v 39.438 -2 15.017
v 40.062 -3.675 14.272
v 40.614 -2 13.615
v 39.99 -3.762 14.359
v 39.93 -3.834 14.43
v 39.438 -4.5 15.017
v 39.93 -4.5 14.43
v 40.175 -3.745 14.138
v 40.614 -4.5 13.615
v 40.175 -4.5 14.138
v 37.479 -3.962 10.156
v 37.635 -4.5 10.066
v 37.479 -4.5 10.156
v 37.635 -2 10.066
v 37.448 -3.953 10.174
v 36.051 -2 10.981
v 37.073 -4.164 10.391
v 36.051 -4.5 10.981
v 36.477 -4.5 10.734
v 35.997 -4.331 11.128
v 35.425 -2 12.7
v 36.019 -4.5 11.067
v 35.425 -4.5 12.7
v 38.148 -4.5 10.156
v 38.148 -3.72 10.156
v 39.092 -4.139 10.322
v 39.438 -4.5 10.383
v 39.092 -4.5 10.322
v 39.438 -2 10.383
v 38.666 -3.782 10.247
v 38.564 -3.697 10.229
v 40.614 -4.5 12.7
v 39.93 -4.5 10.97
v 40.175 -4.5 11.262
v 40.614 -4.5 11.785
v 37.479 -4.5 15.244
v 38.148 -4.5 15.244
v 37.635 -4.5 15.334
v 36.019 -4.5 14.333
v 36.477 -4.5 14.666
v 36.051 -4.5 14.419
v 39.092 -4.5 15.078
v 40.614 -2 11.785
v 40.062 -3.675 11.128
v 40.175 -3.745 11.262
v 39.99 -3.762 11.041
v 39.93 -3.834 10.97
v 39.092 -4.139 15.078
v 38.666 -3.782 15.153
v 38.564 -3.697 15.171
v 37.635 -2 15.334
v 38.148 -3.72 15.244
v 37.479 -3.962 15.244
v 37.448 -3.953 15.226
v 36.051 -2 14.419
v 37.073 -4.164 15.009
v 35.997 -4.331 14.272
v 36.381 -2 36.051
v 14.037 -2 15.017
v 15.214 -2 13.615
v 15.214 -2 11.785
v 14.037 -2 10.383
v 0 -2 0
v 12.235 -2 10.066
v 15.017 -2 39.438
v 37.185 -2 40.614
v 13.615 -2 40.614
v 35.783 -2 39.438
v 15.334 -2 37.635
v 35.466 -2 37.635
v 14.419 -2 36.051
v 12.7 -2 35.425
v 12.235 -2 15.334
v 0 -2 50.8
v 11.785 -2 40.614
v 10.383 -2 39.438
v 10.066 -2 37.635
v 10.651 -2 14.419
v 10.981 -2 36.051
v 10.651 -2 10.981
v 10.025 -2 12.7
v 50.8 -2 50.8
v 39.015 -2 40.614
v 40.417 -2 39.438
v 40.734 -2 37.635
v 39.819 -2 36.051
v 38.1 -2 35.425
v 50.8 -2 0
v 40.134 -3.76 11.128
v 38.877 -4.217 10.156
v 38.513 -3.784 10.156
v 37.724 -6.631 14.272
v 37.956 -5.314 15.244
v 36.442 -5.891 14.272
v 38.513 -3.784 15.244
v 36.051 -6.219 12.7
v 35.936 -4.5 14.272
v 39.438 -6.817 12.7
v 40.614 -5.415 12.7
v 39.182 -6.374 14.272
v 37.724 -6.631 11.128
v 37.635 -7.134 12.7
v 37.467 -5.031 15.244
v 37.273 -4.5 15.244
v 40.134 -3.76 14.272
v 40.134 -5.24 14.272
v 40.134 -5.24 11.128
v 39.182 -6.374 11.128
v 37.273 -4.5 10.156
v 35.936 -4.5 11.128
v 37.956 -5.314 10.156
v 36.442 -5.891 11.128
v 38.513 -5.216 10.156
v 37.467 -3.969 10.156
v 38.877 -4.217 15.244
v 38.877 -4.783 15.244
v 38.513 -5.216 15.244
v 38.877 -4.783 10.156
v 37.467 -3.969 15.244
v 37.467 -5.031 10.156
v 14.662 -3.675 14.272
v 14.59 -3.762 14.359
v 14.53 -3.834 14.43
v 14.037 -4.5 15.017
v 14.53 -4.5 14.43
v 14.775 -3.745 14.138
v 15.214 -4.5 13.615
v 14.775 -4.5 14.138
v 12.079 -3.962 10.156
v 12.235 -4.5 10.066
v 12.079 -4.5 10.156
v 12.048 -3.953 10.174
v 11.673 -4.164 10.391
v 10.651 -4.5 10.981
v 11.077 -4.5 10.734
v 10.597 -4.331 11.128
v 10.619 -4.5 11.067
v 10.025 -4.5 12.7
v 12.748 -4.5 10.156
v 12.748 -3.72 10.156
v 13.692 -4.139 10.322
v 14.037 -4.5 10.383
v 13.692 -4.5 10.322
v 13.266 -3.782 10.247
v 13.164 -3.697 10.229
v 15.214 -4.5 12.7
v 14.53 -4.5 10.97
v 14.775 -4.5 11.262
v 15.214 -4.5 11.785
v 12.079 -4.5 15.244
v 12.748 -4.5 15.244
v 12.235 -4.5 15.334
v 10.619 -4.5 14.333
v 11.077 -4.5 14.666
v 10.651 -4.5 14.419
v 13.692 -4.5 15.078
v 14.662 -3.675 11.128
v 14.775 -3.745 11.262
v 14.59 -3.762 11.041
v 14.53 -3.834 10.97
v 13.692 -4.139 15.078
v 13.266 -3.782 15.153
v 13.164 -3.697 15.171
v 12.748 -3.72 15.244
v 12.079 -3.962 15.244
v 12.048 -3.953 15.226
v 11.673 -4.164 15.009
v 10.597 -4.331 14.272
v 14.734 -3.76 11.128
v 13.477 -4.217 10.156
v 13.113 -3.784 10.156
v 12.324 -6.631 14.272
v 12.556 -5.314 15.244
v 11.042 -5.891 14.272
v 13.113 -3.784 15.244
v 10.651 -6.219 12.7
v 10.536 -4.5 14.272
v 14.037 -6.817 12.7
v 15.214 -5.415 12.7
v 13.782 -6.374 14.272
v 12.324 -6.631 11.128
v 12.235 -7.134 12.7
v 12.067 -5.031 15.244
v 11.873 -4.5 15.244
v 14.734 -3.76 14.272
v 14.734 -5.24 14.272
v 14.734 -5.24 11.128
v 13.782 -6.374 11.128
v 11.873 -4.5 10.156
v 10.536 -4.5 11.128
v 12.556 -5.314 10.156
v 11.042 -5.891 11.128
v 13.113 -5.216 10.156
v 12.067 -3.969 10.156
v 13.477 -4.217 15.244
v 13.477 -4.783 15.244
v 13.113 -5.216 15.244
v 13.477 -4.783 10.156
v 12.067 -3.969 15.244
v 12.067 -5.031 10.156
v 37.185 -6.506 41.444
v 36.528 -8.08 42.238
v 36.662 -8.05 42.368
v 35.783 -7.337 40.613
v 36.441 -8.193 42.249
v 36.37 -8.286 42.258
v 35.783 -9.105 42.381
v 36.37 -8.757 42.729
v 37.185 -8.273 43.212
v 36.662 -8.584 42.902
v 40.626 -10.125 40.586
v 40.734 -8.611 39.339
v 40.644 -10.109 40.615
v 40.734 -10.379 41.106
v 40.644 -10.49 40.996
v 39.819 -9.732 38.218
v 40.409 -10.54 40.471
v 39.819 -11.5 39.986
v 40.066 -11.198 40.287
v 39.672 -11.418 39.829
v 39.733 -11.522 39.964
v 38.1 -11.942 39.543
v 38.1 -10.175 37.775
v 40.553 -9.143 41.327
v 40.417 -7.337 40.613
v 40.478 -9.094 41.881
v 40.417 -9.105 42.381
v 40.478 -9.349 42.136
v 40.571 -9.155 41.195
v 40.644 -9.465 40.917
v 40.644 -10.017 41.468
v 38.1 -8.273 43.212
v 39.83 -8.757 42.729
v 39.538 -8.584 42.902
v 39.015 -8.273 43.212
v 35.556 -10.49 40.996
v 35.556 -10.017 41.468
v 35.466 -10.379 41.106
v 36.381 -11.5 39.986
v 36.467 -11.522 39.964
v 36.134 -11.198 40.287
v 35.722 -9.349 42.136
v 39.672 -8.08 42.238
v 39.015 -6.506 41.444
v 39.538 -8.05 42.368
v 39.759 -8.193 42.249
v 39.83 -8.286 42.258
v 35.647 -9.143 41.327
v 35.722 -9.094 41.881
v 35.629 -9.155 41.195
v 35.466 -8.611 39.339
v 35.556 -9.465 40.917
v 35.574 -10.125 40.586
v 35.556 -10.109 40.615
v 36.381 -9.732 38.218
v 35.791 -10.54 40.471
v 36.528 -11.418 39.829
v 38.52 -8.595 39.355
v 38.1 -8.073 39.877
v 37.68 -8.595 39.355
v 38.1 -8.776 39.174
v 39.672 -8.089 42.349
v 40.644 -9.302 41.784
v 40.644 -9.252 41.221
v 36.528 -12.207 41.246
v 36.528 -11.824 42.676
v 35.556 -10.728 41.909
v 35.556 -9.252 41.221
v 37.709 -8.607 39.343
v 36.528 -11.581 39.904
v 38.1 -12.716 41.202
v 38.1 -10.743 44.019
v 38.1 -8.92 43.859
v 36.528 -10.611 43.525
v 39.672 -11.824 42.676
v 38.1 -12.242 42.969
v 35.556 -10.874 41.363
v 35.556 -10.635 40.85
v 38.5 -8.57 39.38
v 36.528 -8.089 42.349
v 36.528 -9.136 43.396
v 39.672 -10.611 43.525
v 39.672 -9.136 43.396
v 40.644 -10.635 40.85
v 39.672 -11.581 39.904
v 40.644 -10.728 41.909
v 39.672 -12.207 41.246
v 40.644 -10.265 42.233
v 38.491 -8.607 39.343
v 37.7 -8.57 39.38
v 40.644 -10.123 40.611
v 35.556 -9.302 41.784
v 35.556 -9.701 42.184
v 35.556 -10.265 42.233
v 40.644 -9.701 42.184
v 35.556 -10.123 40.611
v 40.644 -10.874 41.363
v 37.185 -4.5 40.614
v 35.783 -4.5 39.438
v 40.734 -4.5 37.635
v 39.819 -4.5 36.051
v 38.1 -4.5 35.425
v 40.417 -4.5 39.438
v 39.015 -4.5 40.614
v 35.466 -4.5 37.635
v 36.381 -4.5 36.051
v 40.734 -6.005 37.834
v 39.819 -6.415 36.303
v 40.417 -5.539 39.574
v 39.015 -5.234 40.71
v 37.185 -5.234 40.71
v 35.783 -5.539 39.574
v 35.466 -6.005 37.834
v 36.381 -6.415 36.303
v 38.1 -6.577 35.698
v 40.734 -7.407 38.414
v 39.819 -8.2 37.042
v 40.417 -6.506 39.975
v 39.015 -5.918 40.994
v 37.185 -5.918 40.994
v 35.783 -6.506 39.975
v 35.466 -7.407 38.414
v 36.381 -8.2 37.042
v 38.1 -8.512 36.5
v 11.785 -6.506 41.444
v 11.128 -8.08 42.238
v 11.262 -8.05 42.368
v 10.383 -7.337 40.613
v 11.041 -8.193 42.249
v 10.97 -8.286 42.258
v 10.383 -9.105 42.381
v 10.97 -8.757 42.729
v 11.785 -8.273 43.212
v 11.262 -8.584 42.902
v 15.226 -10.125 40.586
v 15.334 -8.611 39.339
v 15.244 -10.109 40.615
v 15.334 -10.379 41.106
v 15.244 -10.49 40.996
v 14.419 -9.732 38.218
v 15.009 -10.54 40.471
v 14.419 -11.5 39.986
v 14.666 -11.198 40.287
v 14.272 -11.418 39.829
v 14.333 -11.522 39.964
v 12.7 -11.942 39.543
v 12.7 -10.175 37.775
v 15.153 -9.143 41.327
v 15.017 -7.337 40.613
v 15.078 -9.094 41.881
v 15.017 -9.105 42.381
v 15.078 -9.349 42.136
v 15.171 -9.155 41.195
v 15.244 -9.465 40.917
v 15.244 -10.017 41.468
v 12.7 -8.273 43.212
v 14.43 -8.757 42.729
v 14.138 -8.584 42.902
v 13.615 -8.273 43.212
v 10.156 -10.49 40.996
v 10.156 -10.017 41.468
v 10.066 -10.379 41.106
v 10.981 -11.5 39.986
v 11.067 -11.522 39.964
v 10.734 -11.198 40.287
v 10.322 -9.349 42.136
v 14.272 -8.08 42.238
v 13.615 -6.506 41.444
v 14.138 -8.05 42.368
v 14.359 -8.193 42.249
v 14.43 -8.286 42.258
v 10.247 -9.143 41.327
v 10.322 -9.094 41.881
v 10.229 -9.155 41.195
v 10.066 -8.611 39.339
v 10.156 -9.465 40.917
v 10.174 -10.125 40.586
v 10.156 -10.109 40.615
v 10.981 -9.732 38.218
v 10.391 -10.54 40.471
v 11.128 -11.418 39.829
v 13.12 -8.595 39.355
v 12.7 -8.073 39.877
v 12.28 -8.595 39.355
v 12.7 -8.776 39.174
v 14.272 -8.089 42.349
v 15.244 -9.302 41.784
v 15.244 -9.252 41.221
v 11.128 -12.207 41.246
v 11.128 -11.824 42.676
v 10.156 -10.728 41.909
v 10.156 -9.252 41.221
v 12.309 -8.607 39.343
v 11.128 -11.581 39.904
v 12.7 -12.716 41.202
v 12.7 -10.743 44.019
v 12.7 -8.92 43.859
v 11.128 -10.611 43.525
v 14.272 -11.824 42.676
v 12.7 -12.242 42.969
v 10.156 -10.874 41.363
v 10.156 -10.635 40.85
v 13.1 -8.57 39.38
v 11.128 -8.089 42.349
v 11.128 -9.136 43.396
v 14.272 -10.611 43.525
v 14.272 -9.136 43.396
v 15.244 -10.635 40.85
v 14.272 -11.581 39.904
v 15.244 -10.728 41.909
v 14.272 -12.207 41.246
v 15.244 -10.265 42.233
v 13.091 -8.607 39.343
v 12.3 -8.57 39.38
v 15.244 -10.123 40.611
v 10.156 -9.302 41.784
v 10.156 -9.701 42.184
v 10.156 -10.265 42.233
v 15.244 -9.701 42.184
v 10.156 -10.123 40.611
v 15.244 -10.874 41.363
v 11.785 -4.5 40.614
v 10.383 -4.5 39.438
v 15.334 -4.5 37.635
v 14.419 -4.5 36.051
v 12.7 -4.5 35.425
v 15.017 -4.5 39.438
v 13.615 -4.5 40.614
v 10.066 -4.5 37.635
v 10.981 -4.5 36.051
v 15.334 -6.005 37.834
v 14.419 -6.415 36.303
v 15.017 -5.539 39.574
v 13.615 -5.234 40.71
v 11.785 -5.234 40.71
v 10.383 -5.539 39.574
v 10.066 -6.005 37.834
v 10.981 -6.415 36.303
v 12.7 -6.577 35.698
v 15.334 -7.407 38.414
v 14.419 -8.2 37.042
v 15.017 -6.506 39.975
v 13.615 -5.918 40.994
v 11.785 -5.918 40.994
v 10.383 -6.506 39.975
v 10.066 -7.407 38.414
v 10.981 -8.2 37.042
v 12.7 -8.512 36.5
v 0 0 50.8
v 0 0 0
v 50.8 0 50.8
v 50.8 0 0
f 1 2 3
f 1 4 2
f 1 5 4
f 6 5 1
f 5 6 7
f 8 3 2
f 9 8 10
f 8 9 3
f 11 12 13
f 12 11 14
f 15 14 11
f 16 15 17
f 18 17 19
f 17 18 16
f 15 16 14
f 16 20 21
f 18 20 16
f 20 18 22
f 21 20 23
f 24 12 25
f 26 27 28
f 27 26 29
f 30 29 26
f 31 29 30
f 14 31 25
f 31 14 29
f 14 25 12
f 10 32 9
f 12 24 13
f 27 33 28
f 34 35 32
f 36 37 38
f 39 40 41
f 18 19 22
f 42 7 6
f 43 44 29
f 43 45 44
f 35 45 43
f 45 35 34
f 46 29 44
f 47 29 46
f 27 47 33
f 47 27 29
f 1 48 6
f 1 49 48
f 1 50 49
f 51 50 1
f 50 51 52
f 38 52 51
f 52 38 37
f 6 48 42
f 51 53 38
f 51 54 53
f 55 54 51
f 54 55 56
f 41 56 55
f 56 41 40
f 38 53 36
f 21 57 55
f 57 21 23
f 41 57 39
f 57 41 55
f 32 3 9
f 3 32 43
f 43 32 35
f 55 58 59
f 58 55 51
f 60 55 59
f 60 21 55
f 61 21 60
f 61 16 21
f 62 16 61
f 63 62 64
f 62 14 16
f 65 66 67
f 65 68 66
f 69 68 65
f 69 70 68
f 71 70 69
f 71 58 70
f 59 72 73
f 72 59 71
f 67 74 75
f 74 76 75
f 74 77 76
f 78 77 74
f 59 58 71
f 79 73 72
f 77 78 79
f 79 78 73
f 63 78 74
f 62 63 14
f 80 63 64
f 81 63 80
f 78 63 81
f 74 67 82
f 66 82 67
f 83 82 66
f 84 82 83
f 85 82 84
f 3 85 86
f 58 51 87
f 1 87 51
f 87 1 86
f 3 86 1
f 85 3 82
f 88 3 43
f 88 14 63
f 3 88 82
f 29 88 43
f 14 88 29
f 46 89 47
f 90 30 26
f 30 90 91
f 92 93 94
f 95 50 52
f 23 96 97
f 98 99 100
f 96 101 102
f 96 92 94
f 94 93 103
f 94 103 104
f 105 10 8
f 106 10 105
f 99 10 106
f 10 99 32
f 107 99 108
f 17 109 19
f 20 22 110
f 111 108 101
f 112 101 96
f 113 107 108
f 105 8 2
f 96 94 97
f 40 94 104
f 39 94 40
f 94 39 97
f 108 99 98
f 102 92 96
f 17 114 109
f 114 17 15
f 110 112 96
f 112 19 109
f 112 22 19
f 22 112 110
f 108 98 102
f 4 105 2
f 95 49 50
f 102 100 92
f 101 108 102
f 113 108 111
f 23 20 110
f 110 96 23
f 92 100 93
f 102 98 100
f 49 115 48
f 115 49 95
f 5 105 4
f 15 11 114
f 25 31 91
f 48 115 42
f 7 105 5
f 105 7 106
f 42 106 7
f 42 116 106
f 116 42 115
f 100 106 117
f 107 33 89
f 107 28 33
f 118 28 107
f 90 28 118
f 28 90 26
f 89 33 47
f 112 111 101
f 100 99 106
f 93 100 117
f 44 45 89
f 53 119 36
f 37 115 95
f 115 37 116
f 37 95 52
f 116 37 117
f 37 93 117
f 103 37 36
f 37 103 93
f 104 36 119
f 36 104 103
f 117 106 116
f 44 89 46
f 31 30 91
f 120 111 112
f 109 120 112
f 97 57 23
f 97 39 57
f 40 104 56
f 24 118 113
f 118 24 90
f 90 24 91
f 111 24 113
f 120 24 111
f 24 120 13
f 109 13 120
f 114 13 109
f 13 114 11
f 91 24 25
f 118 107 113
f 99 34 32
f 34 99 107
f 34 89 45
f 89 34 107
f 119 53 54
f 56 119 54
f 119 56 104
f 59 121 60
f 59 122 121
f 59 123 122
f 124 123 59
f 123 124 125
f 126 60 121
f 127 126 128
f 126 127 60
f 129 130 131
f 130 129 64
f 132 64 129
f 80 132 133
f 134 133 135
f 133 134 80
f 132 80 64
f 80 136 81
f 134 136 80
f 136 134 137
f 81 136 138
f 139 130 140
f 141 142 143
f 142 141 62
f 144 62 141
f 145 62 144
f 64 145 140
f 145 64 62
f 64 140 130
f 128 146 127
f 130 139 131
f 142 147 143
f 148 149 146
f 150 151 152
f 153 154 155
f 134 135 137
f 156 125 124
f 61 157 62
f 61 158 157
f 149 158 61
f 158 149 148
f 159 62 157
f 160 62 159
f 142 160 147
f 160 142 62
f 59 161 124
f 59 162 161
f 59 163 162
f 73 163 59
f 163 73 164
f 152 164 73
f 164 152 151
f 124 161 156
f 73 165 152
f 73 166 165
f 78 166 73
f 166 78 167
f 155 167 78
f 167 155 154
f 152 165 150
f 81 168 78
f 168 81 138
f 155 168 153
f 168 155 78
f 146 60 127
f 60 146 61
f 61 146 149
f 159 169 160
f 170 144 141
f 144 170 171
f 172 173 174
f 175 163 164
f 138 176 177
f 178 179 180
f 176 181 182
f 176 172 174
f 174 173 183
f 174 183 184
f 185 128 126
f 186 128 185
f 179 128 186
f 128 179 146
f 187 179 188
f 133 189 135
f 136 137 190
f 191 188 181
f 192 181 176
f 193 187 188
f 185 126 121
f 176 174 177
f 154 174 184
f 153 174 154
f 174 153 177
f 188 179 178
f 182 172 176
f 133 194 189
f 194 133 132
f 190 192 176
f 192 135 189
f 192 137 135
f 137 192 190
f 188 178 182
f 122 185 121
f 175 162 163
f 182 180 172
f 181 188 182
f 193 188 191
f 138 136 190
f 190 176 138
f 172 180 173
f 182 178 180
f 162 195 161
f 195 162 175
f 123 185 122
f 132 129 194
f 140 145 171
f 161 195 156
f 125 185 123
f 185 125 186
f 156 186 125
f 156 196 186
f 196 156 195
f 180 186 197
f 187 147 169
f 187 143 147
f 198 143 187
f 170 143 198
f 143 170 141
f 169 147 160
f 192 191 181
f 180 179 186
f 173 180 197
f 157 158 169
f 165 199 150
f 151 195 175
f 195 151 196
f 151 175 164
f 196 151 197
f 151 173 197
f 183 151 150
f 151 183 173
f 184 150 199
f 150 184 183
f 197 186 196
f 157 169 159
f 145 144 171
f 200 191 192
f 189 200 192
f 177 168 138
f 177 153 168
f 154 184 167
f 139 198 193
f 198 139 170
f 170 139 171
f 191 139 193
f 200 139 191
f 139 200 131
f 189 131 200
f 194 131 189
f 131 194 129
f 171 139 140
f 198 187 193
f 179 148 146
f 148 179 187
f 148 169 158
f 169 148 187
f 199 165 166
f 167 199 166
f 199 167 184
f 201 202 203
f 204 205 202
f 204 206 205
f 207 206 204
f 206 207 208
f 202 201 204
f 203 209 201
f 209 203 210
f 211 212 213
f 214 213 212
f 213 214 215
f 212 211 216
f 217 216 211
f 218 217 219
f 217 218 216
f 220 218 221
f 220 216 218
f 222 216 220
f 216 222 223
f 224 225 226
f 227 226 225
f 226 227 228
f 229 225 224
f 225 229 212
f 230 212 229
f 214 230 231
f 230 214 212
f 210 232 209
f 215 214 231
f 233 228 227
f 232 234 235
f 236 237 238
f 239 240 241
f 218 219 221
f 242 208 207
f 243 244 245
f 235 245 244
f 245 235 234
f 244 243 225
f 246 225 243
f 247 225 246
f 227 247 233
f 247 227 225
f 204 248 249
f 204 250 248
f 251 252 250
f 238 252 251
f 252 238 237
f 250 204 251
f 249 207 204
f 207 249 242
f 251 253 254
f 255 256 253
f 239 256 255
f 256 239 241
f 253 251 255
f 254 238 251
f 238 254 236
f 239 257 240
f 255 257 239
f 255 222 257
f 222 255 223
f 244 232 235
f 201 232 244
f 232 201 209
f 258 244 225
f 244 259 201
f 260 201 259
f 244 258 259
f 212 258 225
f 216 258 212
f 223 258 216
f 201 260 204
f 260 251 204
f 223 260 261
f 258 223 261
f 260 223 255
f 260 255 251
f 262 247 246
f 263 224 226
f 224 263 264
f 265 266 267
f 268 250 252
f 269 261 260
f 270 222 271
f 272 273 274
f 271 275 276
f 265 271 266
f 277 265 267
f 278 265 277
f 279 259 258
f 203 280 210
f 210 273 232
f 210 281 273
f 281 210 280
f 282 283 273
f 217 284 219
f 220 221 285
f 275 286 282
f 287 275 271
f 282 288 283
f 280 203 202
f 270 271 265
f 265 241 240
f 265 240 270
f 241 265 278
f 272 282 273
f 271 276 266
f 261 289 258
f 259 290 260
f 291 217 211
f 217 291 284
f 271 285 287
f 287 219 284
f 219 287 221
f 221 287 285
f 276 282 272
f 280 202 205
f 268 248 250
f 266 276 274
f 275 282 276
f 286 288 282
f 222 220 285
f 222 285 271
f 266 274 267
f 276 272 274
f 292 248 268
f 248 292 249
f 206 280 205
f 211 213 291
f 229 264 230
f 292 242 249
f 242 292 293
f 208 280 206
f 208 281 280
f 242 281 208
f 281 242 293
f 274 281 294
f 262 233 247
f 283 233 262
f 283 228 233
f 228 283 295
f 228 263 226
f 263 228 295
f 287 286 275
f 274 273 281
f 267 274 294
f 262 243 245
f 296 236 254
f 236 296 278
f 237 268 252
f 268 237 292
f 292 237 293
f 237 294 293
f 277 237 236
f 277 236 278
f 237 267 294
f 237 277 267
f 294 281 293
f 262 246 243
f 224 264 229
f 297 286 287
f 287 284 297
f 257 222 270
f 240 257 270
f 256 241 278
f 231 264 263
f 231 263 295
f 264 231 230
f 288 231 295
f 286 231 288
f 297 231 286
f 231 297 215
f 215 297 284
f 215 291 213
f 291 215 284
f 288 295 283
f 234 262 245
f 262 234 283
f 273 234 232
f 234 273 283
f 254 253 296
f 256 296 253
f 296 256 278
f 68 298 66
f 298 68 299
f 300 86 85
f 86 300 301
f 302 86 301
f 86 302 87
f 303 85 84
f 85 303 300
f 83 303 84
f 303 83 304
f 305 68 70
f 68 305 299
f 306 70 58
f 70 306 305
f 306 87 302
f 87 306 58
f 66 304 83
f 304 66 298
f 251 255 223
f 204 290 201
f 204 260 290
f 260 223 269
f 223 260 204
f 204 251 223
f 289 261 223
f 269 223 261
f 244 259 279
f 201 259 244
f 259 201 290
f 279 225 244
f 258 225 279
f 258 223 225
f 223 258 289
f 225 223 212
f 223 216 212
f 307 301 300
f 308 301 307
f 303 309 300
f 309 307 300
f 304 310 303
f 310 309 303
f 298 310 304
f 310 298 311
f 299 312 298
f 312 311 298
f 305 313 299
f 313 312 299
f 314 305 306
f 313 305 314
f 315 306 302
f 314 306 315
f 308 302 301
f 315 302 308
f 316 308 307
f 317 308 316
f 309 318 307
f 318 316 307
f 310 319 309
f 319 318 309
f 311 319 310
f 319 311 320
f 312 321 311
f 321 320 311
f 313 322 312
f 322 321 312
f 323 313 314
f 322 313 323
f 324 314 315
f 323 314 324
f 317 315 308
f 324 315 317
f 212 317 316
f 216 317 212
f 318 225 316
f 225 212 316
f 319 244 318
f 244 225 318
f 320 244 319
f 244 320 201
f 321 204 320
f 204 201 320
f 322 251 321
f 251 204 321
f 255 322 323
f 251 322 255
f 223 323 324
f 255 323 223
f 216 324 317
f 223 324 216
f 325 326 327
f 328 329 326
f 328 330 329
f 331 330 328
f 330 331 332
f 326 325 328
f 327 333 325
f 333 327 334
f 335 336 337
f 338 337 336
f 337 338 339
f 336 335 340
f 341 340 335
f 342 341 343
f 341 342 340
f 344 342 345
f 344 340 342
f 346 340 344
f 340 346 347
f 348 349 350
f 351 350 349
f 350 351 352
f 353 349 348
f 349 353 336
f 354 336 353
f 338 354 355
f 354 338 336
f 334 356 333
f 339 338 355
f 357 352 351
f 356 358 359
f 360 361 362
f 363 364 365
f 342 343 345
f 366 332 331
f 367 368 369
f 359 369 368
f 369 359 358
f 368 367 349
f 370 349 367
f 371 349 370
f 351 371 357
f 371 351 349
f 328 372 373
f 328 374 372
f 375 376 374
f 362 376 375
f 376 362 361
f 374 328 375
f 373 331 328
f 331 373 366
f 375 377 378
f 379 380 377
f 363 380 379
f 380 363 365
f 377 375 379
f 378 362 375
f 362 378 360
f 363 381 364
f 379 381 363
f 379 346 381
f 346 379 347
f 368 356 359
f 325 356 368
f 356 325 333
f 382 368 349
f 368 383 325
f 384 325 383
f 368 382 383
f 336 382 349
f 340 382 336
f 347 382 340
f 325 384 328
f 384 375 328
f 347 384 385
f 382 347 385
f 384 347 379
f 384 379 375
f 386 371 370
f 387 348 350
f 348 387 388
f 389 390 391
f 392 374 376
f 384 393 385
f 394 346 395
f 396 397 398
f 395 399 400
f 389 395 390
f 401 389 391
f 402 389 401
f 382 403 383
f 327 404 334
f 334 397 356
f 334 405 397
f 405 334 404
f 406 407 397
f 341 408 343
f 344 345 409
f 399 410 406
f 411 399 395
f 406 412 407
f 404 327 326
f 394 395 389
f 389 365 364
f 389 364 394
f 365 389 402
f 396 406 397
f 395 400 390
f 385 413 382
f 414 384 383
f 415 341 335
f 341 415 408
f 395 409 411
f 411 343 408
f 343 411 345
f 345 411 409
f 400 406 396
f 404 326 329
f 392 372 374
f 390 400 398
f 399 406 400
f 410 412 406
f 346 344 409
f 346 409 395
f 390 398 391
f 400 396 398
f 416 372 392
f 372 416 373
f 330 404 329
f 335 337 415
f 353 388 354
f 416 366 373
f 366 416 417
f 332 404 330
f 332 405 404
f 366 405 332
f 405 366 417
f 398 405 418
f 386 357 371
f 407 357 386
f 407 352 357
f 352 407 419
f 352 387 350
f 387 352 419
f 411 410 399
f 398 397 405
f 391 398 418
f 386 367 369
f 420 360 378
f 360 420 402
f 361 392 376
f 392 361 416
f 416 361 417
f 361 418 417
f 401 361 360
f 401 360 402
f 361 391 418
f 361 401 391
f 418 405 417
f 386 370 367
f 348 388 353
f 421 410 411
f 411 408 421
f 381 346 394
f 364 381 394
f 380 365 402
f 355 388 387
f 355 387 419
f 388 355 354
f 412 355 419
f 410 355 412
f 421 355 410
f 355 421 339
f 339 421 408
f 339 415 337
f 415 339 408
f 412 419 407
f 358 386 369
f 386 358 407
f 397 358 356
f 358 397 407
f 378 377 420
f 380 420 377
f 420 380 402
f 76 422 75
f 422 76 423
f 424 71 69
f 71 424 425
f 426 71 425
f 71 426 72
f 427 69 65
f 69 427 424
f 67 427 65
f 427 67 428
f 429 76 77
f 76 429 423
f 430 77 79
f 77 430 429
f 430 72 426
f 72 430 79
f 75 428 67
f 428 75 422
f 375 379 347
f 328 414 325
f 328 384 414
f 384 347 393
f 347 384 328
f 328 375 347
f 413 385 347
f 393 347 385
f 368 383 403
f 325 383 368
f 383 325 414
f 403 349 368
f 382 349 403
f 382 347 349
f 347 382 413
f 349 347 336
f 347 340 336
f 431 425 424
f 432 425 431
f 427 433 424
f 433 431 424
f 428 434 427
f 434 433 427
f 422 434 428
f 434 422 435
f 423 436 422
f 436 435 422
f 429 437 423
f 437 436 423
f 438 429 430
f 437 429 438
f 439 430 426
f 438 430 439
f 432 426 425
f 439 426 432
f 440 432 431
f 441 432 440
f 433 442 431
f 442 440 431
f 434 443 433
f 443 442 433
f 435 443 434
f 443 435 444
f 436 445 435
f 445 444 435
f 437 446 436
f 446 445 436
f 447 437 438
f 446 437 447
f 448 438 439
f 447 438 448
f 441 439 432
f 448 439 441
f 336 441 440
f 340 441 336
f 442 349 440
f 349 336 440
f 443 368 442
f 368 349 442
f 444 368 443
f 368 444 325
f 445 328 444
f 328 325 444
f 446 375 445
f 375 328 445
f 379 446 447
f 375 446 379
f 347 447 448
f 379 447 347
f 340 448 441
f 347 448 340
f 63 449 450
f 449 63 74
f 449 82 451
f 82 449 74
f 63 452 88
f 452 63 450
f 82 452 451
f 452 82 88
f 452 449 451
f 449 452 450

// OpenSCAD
// file: Parametric_Pegboard_Base.scad
 // What size are the holes that we'll be going into?  Standard U.S. pegboard holes are 0.25" diameter
 hole_size = 0.25 * 25.4;

 // How far undersized should the pegs be to actually fit in the holes?
 peg_clearance = 0.25;

 // How thick is your pegboard?
 peg_height = 0.125 * 25.4;

 // What angle should the top pegs be bent at?
 peg_angle = 60;

 // Hole spacing.  Standard pegboard holes are 1" on center
 hole_center_to_center = 1 * 25.4;

 // How many rows of pegs?
 peg_rows = 2;

 // How many columns of pegs?
 peg_cols = 2;

 // How thick do you want the base?
 base_depth = 5;

 // ------------------- END PARAMETERS -----------------

//pegboard_base(peg_cols, peg_rows, hole_center_to_center, peg_height, base_depth, hole_size, peg_clearance, peg_angle);

//pegboard_base();

module pegboard_base(
cols = peg_cols,
rows = peg_rows,
spacing = hole_center_to_center,
height = peg_height,
depth = base_depth,
hole_size = hole_size,
clearance = peg_clearance,
angle = peg_angle)

{
    radius = hole_size / 2 - clearance;

    translate([spacing * (cols - 0.5), -depth, spacing / 2])
    rotate([180,180,0])
    {
        translate([-spacing / 2, -depth, -spacing / 2])
        cube([cols * spacing, depth, rows * spacing]);
        peg_grid(cols, rows, spacing, height, radius, angle);
    }
}

module peg_grid(cols, rows, spacing, height, radius, angle)
{
    for(row = [0 : rows - 2])
    {
        translate([0,0, row * spacing])
        peg_row(cols, spacing, height, radius);
    }

    translate([0, 0, (rows - 1) * spacing])
    top_peg_row(cols, spacing, height, radius, angle);
}

module top_peg_row(cols, spacing, height, radius, angle)
{
    peg_row(cols, spacing, height, radius, angle);
}

module peg_row(cols, spacing, height, radius, angle = 0)
{
    for(col = [0 : cols - 1])
    {
        translate([col * spacing, 0, 0])
        if(angle == 0) {
            rounded_peg(radius, height);
        } else {
            top_peg(radius, height, angle);
        }
    }
}

module top_peg(radius, height, angle = 60)
{
    rotate([0, 90, 0])
    {
        // Base peg
        peg(radius, height);

        // Bend
        translate([-2 * radius, height, 0])
        rotate_extrude2(angle = angle)
        translate([2 * radius, 0])
        circle(r = radius);

        // Extended peg
        translate([-2 * radius, height, 0])
        rotate([0,0,angle])
        translate([2 * radius, 0, 0])
        rounded_peg(radius, height);
        }
}

module rounded_peg(radius, height)
{
    peg(radius, height);
    translate([0, height, 0])
    sphere(r = radius);
}

module peg(radius, height)
{
    rotate([-90, 0, 0])
    cylinder(r = radius, h = height);
}

  //-------------- EXTERNAL MODULES -------------------

  // http://forum.openscad.org/rotate-extrude-angle-always-360-td19035.html
  module rotate_extrude2(angle=360, convexity=2, size=1000) {

  module angle_cut(angle=90,size=1000) {
    x = size*cos(angle/2);
    y = size*sin(angle/2);
    translate([0,0,-size])
      linear_extrude(2*size) polygon([[0,0],[x,y],[x,size],[-size,size],[-size,-size],[x,-size],[x,-y]]);
  }

  // support for angle parameter in rotate_extrude was added after release 2015.03
  // Thingiverse customizer is still on 2015.03
  angleSupport = (version_num() > 20150399) ? true : false; // Next openscad releases after 2015.03.xx will have support angle parameter
  // Using angle parameter when possible provides huge speed boost, avoids a difference operation

  if (angleSupport) {
    rotate_extrude(angle=angle,convexity=convexity)
      children();
  } else {
    rotate([0,0,angle/2]) difference() {
      rotate_extrude(convexity=convexity) children();
      angle_cut(angle, size);
    }
  }
}
// main file
use <Parametric_Pegboard_Base.scad>;
// For my pegboard, I want to override the following defaults:
// peg_clearance (how far undersized the pegs should be) defaults to 0.25, let's make it 0.5
// peg_height (how thick is the pegboard) defaults to 3.175, but my board is more like 5 or 5.5mm
// peg_angle defaults to 60; trying to fit those in snaps them right off
// IMPORTANT: depth is set to 2 just to provide a quicker print for testing
pegboard_base(2, 2, clearance=0.5, height=2.5, angle=45, depth=2);
